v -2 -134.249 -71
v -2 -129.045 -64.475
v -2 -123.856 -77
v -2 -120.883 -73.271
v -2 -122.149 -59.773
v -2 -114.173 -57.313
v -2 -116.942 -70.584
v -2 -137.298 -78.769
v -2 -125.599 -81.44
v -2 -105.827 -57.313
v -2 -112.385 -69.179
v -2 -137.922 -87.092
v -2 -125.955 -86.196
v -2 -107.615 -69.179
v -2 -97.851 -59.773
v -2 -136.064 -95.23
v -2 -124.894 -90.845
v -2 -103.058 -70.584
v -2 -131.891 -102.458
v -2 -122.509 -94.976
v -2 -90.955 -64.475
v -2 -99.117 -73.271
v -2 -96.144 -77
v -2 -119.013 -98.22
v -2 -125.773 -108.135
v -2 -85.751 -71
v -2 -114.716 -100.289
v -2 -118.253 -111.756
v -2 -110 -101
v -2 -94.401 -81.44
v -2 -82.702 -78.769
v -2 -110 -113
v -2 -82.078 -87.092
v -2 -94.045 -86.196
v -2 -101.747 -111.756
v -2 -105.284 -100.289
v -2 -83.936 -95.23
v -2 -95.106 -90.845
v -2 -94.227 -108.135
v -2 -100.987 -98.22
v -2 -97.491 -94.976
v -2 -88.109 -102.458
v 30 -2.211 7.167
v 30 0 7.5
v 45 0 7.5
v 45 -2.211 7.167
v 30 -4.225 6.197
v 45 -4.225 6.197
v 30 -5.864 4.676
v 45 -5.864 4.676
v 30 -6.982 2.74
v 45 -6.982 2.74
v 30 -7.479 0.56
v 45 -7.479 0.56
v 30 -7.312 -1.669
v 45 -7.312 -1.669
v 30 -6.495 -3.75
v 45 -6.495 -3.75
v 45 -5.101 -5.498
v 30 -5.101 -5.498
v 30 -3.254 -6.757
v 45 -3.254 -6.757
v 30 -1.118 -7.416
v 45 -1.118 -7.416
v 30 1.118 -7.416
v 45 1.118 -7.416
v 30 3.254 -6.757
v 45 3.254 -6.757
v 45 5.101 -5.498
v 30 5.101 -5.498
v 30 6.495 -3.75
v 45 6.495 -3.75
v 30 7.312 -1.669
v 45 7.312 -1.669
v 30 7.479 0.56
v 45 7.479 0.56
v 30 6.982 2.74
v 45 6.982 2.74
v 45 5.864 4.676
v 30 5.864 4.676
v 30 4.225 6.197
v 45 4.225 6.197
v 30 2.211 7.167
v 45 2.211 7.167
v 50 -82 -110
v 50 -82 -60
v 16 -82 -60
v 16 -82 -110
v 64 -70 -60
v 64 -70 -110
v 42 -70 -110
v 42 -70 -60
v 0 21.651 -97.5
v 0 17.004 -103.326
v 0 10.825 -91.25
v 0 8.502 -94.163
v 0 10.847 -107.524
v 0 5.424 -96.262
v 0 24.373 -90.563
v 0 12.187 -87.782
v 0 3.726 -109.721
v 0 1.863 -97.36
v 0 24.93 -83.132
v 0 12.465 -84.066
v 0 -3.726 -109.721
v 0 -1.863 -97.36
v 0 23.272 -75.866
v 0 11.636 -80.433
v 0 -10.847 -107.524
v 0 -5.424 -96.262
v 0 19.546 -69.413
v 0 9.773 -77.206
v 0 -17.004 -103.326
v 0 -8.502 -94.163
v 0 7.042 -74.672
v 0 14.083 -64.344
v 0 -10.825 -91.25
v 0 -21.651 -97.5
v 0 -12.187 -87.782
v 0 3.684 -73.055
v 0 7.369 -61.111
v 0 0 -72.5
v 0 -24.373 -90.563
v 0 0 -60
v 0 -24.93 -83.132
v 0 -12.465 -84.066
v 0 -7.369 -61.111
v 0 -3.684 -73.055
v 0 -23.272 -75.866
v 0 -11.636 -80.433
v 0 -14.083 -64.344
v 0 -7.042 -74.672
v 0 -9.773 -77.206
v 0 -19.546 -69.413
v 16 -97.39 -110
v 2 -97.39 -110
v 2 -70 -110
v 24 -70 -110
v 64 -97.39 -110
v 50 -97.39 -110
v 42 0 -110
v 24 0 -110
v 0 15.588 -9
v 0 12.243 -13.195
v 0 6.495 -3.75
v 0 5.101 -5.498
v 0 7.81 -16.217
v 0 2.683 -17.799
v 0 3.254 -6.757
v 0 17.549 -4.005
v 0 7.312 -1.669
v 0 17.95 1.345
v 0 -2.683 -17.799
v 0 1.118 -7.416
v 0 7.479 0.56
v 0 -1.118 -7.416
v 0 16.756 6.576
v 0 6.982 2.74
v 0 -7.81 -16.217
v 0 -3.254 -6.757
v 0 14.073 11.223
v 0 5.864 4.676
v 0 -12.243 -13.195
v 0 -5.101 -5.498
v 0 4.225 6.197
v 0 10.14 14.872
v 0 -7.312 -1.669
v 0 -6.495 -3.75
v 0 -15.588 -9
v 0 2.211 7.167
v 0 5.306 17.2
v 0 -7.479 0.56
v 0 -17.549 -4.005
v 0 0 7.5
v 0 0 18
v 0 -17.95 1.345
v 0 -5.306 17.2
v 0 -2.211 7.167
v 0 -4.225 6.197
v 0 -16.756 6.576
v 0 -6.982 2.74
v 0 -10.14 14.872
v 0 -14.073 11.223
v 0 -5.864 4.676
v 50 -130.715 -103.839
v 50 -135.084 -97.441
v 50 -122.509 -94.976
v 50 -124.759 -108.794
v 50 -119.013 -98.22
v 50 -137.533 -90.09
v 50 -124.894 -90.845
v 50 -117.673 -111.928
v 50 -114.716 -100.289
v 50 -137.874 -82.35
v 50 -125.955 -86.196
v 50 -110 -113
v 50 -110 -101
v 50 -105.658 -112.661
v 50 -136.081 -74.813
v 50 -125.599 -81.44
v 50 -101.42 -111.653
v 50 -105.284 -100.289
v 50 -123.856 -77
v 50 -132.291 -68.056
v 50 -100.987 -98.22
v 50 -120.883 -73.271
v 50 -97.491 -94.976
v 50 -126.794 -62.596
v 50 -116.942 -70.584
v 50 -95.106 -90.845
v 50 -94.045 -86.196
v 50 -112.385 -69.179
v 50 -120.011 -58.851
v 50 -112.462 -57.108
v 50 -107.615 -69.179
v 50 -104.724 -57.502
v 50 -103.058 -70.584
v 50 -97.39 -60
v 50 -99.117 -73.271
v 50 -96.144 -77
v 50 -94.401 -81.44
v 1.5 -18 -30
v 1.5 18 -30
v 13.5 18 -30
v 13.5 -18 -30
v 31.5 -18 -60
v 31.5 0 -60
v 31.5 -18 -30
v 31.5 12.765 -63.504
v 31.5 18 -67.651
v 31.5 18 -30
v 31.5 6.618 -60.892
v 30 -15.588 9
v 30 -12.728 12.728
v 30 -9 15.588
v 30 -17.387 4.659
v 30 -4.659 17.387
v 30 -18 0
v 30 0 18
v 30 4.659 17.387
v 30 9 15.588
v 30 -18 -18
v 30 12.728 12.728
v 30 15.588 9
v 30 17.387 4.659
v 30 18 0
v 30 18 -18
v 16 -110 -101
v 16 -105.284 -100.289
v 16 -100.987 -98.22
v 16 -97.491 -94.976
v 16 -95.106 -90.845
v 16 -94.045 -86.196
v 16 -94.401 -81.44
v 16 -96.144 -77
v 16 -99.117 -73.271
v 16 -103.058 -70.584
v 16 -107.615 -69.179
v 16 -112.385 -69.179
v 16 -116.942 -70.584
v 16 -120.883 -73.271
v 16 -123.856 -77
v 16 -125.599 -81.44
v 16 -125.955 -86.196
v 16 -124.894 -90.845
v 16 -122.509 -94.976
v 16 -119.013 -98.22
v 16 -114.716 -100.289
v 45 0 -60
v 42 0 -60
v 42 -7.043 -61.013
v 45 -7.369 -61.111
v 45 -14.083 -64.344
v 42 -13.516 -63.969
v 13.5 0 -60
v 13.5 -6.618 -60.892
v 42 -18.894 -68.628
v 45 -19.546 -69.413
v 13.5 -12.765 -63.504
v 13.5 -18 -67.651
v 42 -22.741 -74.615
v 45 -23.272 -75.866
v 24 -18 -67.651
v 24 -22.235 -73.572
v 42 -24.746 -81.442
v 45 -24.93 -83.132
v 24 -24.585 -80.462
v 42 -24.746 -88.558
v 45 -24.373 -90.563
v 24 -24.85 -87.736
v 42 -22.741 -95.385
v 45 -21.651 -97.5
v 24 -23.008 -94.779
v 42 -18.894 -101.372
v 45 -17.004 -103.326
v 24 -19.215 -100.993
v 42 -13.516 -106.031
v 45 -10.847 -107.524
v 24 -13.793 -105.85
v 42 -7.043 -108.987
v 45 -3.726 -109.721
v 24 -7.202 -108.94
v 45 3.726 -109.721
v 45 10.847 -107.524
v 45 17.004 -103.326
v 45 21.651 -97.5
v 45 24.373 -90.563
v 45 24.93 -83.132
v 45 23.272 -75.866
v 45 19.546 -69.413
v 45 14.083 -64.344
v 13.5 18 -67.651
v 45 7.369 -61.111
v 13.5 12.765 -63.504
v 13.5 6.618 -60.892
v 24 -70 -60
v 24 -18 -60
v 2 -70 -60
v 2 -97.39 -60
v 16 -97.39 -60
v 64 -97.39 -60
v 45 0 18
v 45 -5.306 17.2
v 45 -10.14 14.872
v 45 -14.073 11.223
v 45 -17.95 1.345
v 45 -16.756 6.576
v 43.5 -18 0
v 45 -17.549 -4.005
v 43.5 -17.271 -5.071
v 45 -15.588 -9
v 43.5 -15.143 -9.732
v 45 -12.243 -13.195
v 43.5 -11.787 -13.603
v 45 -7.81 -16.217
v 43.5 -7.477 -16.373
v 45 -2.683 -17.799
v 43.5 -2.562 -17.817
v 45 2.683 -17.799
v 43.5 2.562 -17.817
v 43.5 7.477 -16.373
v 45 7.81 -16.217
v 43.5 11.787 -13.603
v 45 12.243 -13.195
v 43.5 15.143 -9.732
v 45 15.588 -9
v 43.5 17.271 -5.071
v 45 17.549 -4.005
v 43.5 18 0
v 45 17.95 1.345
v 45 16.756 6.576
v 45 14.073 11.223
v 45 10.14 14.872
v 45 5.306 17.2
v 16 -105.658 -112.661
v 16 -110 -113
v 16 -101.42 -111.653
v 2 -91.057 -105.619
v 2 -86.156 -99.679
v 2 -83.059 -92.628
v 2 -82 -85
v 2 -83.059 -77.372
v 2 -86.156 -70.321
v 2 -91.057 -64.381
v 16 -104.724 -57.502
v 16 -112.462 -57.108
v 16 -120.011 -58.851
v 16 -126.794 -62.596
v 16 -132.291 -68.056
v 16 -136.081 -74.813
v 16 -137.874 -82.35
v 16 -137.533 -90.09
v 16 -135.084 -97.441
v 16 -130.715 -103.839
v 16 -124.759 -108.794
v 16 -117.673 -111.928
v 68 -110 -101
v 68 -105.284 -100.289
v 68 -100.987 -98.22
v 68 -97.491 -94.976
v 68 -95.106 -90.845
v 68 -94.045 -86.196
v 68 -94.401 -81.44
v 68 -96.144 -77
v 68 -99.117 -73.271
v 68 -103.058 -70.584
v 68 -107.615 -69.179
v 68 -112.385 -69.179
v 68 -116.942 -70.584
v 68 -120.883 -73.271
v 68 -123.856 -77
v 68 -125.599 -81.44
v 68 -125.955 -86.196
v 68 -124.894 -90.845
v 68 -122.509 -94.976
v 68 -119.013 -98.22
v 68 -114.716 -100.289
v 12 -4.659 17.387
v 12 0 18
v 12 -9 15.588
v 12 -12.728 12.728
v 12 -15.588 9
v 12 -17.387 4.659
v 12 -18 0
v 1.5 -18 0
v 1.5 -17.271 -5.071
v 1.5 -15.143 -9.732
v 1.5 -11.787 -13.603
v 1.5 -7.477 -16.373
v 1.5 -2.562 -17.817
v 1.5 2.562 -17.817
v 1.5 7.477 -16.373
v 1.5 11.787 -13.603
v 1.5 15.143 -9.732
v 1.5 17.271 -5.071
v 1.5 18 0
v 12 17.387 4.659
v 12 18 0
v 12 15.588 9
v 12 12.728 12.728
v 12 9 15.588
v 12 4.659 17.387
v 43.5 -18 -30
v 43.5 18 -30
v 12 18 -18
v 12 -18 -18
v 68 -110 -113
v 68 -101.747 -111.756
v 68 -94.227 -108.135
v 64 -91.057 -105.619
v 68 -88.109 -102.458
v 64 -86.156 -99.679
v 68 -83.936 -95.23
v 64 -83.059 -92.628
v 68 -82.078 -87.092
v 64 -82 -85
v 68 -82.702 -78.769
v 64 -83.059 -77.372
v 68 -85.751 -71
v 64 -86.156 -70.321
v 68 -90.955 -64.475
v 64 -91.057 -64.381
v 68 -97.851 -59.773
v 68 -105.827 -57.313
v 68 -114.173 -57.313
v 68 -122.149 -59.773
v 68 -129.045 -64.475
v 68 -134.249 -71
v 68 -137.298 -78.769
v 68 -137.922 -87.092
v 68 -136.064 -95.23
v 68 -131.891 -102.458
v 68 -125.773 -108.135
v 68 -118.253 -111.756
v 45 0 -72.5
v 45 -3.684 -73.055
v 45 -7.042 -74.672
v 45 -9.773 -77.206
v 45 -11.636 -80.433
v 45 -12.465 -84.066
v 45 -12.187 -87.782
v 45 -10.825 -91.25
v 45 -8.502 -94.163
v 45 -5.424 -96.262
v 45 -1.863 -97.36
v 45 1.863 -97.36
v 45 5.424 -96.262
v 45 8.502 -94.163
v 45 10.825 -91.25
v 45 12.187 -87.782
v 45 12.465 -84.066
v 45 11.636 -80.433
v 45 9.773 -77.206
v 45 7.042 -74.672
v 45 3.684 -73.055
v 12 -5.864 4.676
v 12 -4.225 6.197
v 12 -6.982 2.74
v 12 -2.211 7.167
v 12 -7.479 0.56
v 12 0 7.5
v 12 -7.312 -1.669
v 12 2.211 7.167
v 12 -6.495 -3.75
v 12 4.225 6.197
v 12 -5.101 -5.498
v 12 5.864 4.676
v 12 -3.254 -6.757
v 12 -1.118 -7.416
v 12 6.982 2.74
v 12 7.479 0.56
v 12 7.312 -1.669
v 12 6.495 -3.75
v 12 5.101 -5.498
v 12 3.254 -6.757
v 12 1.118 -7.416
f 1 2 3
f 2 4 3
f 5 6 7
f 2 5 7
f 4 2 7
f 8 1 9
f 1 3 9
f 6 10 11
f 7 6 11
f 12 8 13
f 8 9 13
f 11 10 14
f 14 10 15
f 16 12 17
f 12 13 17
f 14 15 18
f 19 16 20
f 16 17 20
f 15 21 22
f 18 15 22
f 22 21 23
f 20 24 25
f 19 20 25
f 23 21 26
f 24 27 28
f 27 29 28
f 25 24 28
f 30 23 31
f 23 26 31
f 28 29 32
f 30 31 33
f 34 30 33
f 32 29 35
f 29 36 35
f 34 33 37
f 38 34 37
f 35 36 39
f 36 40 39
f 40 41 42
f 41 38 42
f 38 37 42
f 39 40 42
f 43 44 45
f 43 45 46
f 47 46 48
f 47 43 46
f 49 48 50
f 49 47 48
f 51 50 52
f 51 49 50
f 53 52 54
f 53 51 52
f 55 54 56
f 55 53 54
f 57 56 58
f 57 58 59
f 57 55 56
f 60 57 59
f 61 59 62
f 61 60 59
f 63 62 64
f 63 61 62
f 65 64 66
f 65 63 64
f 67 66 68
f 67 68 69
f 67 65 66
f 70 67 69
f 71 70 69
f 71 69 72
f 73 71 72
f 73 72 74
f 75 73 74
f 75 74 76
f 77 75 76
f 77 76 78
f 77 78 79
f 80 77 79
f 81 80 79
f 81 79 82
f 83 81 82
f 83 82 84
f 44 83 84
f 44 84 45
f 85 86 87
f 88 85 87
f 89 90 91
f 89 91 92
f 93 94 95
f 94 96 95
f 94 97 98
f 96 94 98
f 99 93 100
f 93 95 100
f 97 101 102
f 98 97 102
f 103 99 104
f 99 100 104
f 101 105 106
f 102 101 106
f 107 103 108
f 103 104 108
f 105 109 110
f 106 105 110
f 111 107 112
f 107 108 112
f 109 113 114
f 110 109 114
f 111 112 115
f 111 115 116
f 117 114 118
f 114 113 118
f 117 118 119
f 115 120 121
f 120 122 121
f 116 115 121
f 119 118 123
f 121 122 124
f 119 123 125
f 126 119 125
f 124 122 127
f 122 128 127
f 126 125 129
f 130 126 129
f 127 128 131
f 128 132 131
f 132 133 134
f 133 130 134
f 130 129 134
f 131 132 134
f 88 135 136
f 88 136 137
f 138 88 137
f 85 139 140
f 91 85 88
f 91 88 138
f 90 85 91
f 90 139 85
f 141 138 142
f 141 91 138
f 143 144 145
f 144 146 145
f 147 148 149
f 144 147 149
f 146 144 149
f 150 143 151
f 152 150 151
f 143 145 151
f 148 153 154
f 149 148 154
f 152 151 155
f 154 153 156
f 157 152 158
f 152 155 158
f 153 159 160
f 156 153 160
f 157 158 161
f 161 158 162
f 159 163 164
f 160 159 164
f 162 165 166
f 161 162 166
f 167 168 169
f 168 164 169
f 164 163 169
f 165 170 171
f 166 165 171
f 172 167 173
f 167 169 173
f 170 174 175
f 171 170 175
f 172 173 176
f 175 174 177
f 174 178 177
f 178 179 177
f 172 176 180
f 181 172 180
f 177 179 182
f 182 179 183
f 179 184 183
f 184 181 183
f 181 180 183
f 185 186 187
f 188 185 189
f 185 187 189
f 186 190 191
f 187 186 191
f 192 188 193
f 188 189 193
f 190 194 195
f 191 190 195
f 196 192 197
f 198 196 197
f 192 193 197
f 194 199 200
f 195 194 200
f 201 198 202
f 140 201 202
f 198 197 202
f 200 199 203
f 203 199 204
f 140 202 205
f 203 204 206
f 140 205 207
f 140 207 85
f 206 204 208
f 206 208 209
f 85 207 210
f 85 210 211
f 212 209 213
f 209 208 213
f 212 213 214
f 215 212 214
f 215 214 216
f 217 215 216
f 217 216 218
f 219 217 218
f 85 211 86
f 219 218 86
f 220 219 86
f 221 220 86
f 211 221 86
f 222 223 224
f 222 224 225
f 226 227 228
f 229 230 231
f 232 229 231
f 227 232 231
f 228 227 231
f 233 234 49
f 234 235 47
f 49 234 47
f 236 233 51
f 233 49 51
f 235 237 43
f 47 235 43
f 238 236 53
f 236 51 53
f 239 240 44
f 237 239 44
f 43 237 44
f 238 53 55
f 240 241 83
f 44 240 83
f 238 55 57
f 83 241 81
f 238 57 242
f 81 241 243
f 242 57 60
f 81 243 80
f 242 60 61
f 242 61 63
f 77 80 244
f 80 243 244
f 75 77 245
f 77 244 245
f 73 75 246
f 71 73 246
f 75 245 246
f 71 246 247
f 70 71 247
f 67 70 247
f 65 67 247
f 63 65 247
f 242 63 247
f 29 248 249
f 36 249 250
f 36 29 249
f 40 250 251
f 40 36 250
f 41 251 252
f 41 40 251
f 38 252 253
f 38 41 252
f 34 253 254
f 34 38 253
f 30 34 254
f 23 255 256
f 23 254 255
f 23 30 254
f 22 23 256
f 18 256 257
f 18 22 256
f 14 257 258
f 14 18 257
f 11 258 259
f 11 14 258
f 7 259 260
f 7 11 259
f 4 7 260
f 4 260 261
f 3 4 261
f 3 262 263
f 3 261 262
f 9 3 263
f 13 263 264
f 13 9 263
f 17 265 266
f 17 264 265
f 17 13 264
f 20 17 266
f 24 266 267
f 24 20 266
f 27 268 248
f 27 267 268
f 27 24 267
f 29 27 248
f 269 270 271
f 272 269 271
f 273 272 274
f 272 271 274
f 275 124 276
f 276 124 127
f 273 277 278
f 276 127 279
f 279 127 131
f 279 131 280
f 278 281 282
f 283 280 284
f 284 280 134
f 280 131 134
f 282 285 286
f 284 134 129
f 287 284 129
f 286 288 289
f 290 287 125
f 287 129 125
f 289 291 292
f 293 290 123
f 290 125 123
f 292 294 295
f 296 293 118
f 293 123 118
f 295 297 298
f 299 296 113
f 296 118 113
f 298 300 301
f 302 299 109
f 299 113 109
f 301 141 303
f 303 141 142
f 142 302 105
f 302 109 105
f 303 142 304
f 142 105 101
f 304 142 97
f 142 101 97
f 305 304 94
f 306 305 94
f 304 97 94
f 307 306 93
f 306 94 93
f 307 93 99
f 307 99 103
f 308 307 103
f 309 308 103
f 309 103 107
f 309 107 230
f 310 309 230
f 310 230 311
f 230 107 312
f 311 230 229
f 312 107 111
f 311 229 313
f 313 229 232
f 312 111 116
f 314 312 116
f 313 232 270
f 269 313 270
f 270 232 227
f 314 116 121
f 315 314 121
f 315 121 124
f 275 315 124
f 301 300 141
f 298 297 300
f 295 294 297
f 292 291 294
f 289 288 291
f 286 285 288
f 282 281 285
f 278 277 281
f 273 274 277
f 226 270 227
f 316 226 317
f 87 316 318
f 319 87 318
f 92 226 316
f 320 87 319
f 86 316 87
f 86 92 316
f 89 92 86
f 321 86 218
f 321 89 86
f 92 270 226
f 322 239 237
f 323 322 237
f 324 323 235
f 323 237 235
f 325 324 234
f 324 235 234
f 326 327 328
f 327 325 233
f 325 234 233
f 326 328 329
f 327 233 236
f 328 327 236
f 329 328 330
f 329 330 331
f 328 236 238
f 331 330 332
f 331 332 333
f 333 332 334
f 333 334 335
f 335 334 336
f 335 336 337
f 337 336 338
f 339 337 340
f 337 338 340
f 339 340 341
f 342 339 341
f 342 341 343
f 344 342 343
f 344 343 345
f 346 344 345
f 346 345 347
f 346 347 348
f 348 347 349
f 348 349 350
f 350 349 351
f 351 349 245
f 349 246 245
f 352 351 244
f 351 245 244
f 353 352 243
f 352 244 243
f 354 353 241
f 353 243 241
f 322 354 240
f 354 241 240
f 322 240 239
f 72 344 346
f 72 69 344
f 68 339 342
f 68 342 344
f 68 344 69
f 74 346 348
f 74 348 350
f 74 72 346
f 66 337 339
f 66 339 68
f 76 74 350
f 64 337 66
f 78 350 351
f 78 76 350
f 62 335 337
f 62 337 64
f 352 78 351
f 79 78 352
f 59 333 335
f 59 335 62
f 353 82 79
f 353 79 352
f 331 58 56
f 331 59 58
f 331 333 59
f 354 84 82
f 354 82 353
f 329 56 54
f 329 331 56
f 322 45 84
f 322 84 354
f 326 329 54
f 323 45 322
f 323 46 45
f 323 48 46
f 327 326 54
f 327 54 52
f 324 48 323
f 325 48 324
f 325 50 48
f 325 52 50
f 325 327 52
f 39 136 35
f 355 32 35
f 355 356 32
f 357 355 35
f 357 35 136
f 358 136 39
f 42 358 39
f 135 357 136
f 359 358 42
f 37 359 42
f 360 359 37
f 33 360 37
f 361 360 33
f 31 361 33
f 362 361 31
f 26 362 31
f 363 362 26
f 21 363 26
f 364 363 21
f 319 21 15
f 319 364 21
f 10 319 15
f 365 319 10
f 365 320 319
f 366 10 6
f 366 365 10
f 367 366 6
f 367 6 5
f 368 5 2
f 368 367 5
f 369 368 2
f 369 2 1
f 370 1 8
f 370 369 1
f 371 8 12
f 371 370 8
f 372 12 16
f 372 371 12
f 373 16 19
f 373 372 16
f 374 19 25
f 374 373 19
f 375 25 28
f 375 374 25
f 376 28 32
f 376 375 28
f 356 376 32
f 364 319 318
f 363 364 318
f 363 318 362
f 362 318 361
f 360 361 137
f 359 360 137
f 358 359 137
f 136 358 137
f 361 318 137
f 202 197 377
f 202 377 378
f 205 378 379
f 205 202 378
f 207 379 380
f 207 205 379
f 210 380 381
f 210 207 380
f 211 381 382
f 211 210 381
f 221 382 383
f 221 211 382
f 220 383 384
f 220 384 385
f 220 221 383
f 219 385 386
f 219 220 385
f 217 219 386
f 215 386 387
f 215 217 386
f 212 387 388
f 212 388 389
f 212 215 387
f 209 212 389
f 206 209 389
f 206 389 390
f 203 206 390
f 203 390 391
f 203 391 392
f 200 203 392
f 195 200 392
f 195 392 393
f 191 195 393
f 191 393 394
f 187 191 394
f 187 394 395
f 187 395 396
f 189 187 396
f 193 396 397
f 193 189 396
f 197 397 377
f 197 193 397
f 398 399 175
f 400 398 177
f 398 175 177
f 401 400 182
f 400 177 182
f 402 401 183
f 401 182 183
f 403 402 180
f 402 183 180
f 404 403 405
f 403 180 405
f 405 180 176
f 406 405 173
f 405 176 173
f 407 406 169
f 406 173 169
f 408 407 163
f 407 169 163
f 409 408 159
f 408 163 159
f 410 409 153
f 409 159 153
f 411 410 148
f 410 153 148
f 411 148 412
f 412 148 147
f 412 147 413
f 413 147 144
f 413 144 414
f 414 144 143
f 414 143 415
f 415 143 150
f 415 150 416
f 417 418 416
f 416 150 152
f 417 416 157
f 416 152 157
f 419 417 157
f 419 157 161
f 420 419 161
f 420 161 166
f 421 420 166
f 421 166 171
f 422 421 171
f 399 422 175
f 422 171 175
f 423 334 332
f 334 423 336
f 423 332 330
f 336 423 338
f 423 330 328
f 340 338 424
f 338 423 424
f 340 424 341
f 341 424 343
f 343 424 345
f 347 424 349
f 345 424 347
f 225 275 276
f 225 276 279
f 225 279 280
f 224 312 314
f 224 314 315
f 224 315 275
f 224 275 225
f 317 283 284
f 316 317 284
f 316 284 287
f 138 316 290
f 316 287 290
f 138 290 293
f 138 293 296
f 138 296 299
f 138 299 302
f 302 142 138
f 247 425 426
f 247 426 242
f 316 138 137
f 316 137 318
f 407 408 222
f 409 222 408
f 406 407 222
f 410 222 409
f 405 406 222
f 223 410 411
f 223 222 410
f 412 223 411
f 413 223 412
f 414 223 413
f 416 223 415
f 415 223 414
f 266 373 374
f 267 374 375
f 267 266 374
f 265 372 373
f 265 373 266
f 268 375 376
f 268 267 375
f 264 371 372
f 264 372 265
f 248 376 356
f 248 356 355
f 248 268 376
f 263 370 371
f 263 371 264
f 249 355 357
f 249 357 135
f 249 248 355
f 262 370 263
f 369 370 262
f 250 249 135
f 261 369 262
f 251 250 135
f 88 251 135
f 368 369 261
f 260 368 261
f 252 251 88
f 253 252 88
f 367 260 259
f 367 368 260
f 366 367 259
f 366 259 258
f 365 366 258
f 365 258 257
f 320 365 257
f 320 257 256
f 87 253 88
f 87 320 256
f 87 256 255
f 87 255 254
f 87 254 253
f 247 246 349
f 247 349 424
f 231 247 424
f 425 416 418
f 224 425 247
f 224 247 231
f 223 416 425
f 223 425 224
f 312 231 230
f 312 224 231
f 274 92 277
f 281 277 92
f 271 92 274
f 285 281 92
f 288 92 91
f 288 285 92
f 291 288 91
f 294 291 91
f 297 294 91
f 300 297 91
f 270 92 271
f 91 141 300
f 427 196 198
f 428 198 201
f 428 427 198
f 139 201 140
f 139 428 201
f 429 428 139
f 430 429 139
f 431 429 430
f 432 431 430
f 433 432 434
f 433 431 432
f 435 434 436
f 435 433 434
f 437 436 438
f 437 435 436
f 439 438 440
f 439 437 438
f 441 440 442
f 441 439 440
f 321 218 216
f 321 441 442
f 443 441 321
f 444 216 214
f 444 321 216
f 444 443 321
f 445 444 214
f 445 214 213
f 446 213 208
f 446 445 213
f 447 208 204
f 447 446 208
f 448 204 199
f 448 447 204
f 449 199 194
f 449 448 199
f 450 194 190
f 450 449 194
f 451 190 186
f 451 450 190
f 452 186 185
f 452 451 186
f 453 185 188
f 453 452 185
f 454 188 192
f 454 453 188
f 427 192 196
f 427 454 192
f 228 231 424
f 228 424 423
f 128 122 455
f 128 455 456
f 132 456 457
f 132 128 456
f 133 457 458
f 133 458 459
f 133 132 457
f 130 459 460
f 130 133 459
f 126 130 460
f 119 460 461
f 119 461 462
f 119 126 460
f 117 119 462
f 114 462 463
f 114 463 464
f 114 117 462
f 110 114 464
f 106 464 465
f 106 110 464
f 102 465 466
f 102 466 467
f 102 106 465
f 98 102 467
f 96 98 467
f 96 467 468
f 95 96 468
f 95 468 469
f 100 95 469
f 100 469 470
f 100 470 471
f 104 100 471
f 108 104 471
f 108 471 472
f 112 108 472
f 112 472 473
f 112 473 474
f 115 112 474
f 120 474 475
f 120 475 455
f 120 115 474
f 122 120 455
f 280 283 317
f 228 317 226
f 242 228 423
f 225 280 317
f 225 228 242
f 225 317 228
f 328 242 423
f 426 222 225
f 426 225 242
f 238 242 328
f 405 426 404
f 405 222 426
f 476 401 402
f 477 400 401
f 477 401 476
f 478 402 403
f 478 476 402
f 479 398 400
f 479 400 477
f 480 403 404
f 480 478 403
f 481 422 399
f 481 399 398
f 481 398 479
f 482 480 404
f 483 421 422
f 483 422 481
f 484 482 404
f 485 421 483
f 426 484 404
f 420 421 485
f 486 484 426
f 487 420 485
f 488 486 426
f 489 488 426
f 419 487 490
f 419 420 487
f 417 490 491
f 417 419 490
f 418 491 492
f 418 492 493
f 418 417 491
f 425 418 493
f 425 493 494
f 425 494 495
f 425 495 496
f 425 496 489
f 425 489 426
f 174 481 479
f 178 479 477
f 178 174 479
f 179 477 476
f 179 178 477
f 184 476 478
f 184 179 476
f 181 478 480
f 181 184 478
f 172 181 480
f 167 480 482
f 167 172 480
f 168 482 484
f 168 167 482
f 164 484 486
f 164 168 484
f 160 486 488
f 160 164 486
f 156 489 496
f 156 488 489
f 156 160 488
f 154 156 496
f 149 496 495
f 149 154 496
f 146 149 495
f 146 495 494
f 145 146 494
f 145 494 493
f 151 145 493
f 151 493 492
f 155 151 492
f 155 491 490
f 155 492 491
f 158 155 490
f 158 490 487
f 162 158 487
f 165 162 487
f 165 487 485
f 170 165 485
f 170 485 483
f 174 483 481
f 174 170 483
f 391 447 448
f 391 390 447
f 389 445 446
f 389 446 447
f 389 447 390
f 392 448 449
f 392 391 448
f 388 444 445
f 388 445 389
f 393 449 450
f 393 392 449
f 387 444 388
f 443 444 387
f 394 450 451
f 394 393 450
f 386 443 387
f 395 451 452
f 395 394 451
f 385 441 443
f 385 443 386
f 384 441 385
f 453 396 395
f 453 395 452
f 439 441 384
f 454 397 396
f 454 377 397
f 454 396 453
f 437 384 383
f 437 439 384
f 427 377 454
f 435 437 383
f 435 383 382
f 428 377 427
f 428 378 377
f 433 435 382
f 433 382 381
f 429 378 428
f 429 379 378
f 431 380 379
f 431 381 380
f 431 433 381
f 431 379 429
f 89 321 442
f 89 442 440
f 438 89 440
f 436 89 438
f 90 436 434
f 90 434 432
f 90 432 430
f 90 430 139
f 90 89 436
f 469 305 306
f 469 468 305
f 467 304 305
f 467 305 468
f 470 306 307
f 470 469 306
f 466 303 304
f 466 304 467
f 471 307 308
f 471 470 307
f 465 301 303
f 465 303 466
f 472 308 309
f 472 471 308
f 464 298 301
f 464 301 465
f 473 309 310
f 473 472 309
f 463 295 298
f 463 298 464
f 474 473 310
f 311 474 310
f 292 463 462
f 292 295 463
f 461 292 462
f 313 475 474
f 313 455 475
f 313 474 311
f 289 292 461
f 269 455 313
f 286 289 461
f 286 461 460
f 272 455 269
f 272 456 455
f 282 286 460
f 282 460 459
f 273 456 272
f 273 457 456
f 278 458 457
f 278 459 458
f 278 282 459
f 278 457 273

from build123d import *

# Parameters (mm, degrees)
ESQUISSE1_R                  = 18
ESQUISSE1_R_2                = 7.5
BOSS_EXTRU_1_DEPTH           = 45
ESQUISSE1_R_3                = 25
ESQUISSE1_R_4                = 12.5
BOSS_EXTRU_1_2_DEPTH         = 45
BOSS_EXTRU_2_START           = -3
BOSS_EXTRU_2_DEPTH           = 18
ESQUISSE4_R                  = 28
ESQUISSE4_R_2                = 16
BOSS_EXTRU_3_DEPTH           = 35
BOSS_EXTRU_4_DEPTH           = 31
ENL_V_MAT_EXTRU_1_DEPTH      = 201.129957777
ENL_V_MAT_EXTRU_1_DEPTH_BACK = 201.129957777
ESQUISSE6_W                  = 34
ESQUISSE6_H                  = 56
BOSS_EXTRU_5_DEPTH           = 21
BOSS_EXTRU_6_DEPTH           = 9
ESQUISSE10_W                 = 18
ESQUISSE10_H                 = 36
ENL_V_MAT_EXTRU_2_DEPTH      = 205.276773031


with BuildPart() as part:
    # Esquisse1 → Boss.-Extru.1 (new body)
    with BuildSketch(Plane(origin=(0, 0, 0), x_dir=(0, 0, -1), z_dir=(1, 0, 0))):
        Circle(ESQUISSE1_R)
        Circle(ESQUISSE1_R_2, mode=Mode.SUBTRACT)
    extrude(amount=BOSS_EXTRU_1_DEPTH)

    # Esquisse7 → Boss.-Extru.5 (add, symmetric)
    with BuildSketch(Plane.ZY.offset(-22.5)):
        with BuildLine():
            ThreePointArc((0, -18), (-18, 0), (0, 18))
            Line((0, 18), (-30, 18))
            Line((-30, 18), (-30, -18))
            Line((-30, -18), (0, -18))
        make_face()
    extrude(amount=BOSS_EXTRU_5_DEPTH, both=True)



with BuildPart() as body_2:
    # Esquisse1 → Boss.-Extru.1 2 (new body)
    with BuildSketch(Plane(origin=(0, 0, 0), x_dir=(0, 0, -1), z_dir=(1, 0, 0))):
        with Locations((85, 0)):
            Circle(ESQUISSE1_R_3)
        with Locations((85, 0)):
            Circle(ESQUISSE1_R_4, mode=Mode.SUBTRACT)
    extrude(amount=BOSS_EXTRU_1_2_DEPTH)

    # Esquisse3 → Boss.-Extru.2 (add)
    with BuildSketch(Plane(origin=(45, 0, 0), x_dir=(0, 0, -1), z_dir=(1, 0, 0)).offset(BOSS_EXTRU_2_START)):
        with BuildLine():
            Line((60, 0), (60, -70))
            Line((60, -70), (110, -70))
            Line((110, -70), (110, 0))
            ThreePointArc((110, 0), (85, -25), (60, 0))
        make_face()
    extrude(amount=-BOSS_EXTRU_2_DEPTH)



with BuildPart() as body_3:
    # Esquisse4 → Boss.-Extru.3 (new, symmetric)
    with BuildSketch(Plane(origin=(33, 0, 0), x_dir=(0, 0, -1), z_dir=(1, 0, 0))):
        with Locations((85, -110)):
            Circle(ESQUISSE4_R)
        with Locations((85, -110)):
            Circle(ESQUISSE4_R_2, mode=Mode.SUBTRACT)
    extrude(amount=BOSS_EXTRU_3_DEPTH, both=True)


with BuildPart() as body_2_1:
    add(body_2.part)

    add(body_3.part)  # Boss.-Extru.4 merges body 3
    # Esquisse5 → Boss.-Extru.4 (add, symmetric)
    with BuildSketch(Plane(origin=(33, 0, 0), x_dir=(0, 0, -1), z_dir=(1, 0, 0))):
        with BuildLine():
            Line((60, -70), (60, -97.390479787))
            ThreePointArc((60, -97.390479787), (85, -82), (110, -97.390479787))
            Line((110, -97.390479787), (110, -70))
            Line((110, -70), (60, -70))
        make_face()
    extrude(amount=BOSS_EXTRU_4_DEPTH, both=True)

    # Esquisse6 → Enlèv. mat.-Extru.1 (cut, two sides: drawn at the far end of the back side and taken through both)
    with BuildSketch(Plane(origin=(0, 0, -110), x_dir=(-1, 0, 0), z_dir=(0, 0, -1)).offset(-ENL_V_MAT_EXTRU_1_DEPTH_BACK)):
        with Locations((-33, -110)):
            Rectangle(ESQUISSE6_W, ESQUISSE6_H)
    extrude(amount=ENL_V_MAT_EXTRU_1_DEPTH + ENL_V_MAT_EXTRU_1_DEPTH_BACK, mode=Mode.SUBTRACT)


with BuildPart() as part_1:
    add(part.part)

    add(body_2_1.part)  # Boss.-Extru.6 merges body 2
    # Esquisse7<4> → Boss.-Extru.6 (add, symmetric)
    with BuildSketch(Plane.ZY.offset(-22.5)):
        with BuildLine():
            Line((-30, -18), (-30, 18))
            Line((-30, 18), (-67.650648427, 18))
            ThreePointArc((-67.650648427, 18), (-60, 0), (-67.650648427, -18))
            Line((-67.650648427, -18), (-30, -18))
        make_face()
    extrude(amount=BOSS_EXTRU_6_DEPTH, both=True)

    # Esquisse10 → Enlèv. mat.-Extru.2 (cut, through all)
    with BuildSketch(Plane(origin=(0, 18, 0), x_dir=(1, 0, 0), z_dir=(0, 1, 0))):
        with Locations((21, 0)):
            Rectangle(ESQUISSE10_W, ESQUISSE10_H)
    extrude(amount=-ENL_V_MAT_EXTRU_2_DEPTH, mode=Mode.SUBTRACT)


solid = part_1.part
